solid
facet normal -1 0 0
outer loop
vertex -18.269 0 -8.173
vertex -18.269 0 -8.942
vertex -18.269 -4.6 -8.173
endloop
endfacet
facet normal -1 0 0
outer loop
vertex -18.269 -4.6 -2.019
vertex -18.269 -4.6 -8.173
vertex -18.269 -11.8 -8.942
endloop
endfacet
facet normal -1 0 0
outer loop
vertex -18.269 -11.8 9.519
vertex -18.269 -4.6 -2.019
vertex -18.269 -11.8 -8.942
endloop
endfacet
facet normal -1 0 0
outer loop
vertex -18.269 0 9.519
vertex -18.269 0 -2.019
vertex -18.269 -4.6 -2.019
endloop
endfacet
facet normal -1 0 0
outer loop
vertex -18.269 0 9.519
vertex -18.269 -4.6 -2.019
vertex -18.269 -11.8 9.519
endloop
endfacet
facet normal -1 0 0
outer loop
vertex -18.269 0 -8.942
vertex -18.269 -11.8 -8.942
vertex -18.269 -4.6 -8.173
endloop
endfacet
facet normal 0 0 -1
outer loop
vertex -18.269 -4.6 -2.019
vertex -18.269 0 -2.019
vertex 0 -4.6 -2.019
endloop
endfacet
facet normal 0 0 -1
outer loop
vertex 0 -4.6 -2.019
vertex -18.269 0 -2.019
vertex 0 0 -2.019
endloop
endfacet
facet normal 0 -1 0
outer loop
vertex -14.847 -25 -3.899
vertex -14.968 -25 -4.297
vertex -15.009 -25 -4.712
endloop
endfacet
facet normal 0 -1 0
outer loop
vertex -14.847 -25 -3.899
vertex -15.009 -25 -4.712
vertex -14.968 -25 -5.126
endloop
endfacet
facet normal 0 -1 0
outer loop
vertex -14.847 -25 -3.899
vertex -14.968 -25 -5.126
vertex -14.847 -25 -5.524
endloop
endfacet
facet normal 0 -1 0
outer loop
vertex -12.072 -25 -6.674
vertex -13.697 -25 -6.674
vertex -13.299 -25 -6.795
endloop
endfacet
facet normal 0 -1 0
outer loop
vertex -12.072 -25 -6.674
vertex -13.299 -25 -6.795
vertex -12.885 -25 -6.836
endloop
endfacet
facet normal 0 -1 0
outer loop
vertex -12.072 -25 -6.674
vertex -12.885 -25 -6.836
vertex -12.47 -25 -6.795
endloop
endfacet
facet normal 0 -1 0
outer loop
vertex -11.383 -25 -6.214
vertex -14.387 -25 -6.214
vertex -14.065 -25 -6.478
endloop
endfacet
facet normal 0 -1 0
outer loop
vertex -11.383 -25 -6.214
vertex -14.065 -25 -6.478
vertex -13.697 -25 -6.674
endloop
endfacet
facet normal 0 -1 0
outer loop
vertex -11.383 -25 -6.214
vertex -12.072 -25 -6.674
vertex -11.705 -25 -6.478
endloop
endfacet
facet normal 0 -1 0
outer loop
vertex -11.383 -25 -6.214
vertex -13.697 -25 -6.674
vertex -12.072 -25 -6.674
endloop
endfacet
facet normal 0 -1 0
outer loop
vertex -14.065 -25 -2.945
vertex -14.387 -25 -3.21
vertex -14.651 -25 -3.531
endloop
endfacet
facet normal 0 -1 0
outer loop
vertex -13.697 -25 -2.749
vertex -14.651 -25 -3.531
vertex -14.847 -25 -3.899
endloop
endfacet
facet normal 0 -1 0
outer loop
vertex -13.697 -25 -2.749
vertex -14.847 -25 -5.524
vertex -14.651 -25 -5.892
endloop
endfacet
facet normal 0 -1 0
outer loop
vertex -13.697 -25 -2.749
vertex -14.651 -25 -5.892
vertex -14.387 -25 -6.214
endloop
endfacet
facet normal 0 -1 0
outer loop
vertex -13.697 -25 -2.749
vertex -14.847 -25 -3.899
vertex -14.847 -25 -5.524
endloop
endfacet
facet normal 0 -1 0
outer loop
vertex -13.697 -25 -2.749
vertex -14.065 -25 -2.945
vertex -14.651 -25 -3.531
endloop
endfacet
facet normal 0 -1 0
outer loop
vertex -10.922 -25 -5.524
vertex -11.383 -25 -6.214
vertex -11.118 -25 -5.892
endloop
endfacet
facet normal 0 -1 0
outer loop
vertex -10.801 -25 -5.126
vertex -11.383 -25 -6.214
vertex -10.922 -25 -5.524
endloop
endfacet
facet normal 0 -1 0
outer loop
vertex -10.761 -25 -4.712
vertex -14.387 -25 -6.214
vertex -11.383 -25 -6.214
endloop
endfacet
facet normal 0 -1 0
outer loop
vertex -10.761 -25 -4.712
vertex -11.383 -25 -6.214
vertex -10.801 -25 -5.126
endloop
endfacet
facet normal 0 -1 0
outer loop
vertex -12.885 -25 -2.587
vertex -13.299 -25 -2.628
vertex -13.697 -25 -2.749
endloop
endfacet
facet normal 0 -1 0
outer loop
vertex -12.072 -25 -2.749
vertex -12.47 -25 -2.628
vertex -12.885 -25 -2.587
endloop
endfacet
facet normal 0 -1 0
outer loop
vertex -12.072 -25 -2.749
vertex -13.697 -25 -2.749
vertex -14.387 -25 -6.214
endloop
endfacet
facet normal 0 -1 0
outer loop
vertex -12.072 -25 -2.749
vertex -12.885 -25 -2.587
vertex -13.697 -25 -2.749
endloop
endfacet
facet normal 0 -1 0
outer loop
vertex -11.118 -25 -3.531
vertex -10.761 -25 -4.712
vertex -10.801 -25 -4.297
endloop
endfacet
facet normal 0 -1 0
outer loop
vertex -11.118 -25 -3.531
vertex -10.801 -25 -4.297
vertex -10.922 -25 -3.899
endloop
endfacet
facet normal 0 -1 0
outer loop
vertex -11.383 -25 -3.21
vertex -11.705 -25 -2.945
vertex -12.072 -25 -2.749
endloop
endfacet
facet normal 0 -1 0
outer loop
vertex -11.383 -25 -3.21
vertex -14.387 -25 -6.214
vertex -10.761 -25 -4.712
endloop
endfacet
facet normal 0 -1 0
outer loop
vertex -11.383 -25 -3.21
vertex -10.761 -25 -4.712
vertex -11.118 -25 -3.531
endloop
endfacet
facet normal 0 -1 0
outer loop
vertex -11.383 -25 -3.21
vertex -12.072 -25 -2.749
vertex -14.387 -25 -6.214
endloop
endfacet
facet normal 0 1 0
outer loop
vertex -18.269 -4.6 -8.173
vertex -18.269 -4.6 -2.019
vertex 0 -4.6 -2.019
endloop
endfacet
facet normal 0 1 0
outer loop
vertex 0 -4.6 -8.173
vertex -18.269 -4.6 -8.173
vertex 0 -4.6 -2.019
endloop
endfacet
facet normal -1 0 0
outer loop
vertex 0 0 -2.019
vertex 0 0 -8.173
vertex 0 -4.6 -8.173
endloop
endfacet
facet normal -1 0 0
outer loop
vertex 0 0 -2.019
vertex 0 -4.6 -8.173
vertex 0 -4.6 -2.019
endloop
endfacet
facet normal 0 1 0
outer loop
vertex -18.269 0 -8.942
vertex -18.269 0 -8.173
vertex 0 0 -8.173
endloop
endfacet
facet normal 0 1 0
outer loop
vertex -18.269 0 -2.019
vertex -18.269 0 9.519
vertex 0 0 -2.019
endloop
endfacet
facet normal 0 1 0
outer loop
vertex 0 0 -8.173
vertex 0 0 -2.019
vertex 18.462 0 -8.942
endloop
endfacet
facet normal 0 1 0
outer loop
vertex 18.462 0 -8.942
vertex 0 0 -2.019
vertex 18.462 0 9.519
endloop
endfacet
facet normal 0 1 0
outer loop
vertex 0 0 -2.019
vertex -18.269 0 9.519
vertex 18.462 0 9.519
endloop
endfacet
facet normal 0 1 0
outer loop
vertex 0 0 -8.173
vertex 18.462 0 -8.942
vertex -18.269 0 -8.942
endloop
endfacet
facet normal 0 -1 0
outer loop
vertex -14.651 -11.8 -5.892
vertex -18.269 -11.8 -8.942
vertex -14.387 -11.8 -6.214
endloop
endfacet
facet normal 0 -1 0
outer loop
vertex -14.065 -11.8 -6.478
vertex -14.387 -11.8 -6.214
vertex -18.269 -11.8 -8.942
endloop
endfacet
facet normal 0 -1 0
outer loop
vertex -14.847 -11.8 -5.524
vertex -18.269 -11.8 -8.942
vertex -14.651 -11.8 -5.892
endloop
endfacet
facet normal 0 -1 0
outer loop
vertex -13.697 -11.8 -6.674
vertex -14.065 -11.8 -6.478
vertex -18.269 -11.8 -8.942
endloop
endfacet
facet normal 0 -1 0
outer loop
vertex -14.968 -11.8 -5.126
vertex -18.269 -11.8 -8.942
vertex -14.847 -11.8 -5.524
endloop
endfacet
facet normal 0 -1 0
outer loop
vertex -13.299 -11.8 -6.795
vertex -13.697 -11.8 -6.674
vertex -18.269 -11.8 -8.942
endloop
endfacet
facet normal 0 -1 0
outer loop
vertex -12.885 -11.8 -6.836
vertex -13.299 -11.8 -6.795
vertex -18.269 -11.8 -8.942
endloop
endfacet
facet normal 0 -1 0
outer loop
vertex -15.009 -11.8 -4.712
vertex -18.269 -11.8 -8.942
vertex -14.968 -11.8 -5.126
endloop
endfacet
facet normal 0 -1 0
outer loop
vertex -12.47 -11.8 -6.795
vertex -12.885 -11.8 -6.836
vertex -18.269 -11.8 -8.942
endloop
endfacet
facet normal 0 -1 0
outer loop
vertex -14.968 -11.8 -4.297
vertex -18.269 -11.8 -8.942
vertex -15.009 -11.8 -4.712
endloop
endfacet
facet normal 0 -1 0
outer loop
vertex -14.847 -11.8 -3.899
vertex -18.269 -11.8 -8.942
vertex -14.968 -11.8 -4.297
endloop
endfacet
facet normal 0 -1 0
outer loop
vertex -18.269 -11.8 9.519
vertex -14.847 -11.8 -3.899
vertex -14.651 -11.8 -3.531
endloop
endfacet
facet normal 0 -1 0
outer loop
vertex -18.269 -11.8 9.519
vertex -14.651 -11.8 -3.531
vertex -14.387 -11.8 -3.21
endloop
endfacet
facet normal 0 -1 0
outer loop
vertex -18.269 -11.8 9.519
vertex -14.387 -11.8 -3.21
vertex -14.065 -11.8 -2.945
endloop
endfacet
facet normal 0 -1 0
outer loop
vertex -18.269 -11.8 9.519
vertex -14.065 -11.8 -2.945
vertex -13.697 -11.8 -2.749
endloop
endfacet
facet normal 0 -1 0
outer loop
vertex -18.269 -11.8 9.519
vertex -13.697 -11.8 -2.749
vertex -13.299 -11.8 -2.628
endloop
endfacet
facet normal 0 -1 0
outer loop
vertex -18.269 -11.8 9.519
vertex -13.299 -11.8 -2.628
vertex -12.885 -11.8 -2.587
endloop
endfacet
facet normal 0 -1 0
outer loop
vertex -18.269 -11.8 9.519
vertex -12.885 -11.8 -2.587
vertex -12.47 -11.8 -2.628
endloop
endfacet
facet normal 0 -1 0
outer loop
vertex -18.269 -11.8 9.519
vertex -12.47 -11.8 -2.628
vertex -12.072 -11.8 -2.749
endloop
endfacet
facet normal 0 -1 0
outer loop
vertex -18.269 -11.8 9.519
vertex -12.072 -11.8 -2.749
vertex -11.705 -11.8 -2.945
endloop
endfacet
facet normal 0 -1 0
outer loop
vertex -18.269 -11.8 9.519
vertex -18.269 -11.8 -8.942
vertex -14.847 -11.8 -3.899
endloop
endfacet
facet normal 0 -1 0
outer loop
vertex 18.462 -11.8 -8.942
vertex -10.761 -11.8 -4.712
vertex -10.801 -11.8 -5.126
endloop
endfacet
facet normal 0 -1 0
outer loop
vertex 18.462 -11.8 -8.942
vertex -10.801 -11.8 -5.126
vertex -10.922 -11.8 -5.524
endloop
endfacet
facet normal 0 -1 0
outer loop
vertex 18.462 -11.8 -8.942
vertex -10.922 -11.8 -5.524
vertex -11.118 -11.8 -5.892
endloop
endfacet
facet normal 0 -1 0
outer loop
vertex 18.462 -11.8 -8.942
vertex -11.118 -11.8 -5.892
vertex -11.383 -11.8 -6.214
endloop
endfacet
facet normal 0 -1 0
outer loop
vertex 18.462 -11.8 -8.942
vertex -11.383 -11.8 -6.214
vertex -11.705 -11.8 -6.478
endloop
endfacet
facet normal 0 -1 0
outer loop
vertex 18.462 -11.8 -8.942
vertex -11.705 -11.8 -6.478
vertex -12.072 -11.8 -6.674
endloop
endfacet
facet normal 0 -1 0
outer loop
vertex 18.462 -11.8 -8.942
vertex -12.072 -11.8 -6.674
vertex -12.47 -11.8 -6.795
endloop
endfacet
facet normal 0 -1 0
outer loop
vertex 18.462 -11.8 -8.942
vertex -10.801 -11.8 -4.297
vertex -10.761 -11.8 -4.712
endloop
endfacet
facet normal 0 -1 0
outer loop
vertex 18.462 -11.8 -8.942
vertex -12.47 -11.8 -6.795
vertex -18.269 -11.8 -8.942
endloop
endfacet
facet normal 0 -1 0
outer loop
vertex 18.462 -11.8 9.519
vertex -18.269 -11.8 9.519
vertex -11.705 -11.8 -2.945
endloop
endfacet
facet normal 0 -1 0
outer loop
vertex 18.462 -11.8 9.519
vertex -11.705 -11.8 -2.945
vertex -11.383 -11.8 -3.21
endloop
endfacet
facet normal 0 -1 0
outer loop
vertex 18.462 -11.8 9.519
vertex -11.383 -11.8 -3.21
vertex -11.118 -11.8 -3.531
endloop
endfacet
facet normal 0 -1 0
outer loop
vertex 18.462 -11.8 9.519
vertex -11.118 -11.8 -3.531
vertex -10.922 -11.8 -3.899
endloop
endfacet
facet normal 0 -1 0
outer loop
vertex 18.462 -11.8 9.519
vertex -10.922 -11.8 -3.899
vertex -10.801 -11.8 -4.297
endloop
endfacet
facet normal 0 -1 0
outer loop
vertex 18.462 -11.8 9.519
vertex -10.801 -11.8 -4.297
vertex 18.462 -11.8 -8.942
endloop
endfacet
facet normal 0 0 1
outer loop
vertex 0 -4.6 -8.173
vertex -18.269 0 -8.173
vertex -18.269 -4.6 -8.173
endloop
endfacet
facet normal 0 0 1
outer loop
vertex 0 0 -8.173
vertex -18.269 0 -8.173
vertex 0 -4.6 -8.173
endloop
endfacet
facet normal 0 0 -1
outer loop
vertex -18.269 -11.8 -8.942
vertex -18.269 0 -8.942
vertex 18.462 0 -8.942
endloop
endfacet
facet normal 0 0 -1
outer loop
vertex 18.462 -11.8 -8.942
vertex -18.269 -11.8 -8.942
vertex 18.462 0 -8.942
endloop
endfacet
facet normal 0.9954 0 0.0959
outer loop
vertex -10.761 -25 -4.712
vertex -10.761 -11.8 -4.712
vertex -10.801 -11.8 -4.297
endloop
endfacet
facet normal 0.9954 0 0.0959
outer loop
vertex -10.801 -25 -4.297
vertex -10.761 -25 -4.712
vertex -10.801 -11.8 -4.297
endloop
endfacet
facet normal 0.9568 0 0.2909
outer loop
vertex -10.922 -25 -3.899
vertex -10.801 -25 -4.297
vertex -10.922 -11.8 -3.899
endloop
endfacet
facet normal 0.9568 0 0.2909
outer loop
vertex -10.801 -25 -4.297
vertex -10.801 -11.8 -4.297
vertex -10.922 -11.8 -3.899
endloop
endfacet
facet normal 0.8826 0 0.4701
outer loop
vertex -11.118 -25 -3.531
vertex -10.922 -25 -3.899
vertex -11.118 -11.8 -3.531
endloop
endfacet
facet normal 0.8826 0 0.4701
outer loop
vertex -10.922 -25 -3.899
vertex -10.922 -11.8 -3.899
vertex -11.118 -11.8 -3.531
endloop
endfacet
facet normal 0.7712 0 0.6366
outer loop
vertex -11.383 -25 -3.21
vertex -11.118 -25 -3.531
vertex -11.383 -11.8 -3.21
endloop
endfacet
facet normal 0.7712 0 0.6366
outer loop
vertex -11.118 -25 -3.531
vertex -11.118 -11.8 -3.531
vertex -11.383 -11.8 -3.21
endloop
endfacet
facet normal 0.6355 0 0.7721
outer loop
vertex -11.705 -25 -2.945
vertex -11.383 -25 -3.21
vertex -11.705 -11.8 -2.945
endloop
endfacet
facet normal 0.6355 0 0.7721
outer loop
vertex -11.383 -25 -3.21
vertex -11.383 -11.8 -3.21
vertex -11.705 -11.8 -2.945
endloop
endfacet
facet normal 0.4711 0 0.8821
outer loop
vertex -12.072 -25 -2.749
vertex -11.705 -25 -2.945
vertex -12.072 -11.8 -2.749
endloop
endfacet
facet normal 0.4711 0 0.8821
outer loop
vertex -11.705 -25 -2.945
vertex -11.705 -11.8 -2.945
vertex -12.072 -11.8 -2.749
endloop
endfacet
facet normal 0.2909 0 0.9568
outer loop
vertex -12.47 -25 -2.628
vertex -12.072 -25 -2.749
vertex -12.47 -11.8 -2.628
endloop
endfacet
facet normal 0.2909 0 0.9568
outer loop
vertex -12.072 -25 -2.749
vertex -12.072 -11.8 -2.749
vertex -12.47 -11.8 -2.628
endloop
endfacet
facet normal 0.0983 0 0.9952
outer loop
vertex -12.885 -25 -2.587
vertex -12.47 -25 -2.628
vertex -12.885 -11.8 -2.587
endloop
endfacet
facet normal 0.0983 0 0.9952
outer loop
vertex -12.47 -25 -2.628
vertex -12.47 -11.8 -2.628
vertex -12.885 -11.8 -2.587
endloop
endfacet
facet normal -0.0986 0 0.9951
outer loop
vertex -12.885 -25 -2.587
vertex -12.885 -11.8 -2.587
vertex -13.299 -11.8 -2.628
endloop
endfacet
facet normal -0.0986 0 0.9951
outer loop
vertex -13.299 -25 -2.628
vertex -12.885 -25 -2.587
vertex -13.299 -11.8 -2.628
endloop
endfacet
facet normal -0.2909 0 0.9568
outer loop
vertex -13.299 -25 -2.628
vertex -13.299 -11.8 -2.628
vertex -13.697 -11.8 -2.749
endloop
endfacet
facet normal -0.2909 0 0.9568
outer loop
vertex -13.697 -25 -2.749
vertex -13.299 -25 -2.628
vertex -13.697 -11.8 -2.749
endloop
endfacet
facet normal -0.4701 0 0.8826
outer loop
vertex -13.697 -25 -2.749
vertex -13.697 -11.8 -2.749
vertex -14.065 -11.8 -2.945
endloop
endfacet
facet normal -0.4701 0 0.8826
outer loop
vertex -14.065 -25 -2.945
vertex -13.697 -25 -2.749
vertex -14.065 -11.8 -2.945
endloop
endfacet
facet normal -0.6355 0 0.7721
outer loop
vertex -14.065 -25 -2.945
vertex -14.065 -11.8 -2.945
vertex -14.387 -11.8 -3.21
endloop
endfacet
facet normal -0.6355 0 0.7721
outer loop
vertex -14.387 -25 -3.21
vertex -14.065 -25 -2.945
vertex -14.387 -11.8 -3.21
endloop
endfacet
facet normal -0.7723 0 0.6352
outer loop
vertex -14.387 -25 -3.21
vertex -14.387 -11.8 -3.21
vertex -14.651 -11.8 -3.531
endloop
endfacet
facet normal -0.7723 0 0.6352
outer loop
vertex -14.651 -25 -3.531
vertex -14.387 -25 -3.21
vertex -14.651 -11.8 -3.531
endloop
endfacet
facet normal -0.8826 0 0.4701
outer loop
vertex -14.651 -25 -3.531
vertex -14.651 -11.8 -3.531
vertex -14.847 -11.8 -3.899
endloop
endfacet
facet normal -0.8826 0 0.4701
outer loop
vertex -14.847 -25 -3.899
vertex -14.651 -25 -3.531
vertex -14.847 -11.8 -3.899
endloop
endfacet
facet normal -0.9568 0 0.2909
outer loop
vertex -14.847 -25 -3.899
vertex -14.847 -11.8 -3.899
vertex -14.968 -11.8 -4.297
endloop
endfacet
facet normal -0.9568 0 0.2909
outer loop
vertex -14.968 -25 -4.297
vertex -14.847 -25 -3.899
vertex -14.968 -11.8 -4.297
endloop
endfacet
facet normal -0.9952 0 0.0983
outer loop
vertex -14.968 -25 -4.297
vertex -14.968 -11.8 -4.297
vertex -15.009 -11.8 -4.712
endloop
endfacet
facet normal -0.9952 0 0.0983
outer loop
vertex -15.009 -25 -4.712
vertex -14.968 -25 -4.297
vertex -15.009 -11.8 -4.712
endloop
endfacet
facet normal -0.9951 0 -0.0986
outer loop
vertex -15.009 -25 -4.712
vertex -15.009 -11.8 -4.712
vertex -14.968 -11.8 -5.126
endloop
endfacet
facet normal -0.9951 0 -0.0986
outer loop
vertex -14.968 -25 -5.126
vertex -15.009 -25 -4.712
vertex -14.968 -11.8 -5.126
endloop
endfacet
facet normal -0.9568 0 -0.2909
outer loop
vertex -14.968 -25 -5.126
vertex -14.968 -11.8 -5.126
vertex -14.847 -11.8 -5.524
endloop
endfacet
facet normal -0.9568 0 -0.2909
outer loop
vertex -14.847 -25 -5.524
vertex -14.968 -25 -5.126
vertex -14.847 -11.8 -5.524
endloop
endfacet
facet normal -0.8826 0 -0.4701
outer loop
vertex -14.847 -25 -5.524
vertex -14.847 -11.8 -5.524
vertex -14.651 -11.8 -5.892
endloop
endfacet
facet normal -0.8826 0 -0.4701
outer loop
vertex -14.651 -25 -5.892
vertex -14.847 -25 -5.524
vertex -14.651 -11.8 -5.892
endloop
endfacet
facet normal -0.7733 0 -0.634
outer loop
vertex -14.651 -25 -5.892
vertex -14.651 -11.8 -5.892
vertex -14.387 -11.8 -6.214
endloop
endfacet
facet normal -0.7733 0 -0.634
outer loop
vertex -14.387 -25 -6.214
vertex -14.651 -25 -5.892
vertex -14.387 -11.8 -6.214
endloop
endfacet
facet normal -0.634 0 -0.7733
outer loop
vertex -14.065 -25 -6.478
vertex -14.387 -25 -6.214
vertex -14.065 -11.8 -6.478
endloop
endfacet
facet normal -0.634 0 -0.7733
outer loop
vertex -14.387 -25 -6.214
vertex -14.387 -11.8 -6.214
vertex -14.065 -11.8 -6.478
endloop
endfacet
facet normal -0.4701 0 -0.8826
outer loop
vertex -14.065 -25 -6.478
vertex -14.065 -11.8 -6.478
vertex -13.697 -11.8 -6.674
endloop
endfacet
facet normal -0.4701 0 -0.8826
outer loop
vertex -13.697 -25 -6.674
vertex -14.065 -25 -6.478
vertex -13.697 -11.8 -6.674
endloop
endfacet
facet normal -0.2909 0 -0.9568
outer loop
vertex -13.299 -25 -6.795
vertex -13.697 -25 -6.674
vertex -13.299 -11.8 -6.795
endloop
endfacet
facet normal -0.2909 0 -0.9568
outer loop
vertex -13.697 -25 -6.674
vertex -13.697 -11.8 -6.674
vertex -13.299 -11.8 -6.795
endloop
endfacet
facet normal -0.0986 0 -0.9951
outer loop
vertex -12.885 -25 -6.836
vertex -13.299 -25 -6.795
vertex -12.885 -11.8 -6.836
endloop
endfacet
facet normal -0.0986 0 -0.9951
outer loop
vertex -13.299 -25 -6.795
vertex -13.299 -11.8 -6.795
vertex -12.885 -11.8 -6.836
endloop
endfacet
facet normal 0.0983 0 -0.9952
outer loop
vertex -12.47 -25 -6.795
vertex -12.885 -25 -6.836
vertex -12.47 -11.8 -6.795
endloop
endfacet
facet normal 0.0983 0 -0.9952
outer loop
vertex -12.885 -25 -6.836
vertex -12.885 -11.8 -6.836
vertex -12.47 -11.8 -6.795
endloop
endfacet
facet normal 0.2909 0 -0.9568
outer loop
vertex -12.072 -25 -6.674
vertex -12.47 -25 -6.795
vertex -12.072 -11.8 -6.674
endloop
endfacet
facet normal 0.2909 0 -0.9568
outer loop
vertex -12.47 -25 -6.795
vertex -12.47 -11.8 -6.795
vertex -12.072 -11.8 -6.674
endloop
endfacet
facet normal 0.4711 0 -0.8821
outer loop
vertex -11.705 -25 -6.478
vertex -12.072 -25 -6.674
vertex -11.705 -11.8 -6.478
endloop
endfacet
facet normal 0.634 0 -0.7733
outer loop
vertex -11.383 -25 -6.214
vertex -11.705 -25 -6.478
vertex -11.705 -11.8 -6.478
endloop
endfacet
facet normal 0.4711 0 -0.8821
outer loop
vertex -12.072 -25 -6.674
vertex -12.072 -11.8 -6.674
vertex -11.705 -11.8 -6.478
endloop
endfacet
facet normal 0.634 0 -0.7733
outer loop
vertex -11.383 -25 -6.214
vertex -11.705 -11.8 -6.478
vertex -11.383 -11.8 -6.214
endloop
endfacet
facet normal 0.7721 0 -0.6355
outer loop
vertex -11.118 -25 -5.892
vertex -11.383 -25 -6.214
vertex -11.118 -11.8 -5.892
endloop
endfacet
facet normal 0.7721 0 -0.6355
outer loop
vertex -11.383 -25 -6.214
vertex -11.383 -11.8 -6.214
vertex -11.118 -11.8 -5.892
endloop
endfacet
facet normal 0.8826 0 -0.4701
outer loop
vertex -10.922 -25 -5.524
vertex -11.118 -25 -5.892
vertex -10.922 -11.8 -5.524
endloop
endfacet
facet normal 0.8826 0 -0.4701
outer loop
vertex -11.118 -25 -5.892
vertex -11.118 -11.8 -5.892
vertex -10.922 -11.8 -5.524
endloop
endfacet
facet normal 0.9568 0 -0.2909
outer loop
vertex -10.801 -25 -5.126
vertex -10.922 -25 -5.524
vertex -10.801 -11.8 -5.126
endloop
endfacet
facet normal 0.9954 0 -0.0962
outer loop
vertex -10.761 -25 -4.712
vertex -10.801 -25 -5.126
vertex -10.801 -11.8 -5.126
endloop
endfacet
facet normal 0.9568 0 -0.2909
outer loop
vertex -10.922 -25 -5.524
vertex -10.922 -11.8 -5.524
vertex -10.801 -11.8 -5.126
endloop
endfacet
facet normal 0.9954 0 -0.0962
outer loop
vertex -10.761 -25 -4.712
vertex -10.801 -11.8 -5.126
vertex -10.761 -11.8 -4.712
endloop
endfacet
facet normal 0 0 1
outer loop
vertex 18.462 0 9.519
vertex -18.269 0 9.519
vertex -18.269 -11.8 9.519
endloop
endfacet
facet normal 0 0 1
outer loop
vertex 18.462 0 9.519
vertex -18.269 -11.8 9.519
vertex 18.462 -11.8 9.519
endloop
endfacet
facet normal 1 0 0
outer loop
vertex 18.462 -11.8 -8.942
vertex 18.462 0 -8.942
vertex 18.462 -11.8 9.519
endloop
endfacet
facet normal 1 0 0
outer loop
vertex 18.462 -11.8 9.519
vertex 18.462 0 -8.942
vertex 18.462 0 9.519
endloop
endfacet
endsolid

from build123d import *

# Parameters (mm, degrees)
F0_W     = 36.73077
F0_H     = 18.46154
F1_DEPTH = 11.8
F2_R     = 2.124108
F3_DEPTH = 25
F4_W     = 24.038464
F4_H     = 6.153846
F5_DEPTH = 4.6


with BuildPart() as f1:
    # F0 (on Front) → F1 (new body)
    with BuildSketch(Plane.XZ):
        with Locations((0.096153, 0.288462)):
            Rectangle(F0_W, F0_H)
    extrude(amount=F1_DEPTH)

    # F2 (on Front) → F3 (join)
    with BuildSketch(Plane.XZ):
        with Locations((-12.884616, -4.711539)):
            Circle(F2_R)
    extrude(amount=F3_DEPTH)

    # F4 (on Front) → F5 (cut)
    with BuildSketch(Plane.XZ):
        with Locations((-12.019232, -5.096154)):
            Rectangle(F4_W, F4_H)
    extrude(amount=F5_DEPTH, mode=Mode.SUBTRACT)


solid = f1.part
